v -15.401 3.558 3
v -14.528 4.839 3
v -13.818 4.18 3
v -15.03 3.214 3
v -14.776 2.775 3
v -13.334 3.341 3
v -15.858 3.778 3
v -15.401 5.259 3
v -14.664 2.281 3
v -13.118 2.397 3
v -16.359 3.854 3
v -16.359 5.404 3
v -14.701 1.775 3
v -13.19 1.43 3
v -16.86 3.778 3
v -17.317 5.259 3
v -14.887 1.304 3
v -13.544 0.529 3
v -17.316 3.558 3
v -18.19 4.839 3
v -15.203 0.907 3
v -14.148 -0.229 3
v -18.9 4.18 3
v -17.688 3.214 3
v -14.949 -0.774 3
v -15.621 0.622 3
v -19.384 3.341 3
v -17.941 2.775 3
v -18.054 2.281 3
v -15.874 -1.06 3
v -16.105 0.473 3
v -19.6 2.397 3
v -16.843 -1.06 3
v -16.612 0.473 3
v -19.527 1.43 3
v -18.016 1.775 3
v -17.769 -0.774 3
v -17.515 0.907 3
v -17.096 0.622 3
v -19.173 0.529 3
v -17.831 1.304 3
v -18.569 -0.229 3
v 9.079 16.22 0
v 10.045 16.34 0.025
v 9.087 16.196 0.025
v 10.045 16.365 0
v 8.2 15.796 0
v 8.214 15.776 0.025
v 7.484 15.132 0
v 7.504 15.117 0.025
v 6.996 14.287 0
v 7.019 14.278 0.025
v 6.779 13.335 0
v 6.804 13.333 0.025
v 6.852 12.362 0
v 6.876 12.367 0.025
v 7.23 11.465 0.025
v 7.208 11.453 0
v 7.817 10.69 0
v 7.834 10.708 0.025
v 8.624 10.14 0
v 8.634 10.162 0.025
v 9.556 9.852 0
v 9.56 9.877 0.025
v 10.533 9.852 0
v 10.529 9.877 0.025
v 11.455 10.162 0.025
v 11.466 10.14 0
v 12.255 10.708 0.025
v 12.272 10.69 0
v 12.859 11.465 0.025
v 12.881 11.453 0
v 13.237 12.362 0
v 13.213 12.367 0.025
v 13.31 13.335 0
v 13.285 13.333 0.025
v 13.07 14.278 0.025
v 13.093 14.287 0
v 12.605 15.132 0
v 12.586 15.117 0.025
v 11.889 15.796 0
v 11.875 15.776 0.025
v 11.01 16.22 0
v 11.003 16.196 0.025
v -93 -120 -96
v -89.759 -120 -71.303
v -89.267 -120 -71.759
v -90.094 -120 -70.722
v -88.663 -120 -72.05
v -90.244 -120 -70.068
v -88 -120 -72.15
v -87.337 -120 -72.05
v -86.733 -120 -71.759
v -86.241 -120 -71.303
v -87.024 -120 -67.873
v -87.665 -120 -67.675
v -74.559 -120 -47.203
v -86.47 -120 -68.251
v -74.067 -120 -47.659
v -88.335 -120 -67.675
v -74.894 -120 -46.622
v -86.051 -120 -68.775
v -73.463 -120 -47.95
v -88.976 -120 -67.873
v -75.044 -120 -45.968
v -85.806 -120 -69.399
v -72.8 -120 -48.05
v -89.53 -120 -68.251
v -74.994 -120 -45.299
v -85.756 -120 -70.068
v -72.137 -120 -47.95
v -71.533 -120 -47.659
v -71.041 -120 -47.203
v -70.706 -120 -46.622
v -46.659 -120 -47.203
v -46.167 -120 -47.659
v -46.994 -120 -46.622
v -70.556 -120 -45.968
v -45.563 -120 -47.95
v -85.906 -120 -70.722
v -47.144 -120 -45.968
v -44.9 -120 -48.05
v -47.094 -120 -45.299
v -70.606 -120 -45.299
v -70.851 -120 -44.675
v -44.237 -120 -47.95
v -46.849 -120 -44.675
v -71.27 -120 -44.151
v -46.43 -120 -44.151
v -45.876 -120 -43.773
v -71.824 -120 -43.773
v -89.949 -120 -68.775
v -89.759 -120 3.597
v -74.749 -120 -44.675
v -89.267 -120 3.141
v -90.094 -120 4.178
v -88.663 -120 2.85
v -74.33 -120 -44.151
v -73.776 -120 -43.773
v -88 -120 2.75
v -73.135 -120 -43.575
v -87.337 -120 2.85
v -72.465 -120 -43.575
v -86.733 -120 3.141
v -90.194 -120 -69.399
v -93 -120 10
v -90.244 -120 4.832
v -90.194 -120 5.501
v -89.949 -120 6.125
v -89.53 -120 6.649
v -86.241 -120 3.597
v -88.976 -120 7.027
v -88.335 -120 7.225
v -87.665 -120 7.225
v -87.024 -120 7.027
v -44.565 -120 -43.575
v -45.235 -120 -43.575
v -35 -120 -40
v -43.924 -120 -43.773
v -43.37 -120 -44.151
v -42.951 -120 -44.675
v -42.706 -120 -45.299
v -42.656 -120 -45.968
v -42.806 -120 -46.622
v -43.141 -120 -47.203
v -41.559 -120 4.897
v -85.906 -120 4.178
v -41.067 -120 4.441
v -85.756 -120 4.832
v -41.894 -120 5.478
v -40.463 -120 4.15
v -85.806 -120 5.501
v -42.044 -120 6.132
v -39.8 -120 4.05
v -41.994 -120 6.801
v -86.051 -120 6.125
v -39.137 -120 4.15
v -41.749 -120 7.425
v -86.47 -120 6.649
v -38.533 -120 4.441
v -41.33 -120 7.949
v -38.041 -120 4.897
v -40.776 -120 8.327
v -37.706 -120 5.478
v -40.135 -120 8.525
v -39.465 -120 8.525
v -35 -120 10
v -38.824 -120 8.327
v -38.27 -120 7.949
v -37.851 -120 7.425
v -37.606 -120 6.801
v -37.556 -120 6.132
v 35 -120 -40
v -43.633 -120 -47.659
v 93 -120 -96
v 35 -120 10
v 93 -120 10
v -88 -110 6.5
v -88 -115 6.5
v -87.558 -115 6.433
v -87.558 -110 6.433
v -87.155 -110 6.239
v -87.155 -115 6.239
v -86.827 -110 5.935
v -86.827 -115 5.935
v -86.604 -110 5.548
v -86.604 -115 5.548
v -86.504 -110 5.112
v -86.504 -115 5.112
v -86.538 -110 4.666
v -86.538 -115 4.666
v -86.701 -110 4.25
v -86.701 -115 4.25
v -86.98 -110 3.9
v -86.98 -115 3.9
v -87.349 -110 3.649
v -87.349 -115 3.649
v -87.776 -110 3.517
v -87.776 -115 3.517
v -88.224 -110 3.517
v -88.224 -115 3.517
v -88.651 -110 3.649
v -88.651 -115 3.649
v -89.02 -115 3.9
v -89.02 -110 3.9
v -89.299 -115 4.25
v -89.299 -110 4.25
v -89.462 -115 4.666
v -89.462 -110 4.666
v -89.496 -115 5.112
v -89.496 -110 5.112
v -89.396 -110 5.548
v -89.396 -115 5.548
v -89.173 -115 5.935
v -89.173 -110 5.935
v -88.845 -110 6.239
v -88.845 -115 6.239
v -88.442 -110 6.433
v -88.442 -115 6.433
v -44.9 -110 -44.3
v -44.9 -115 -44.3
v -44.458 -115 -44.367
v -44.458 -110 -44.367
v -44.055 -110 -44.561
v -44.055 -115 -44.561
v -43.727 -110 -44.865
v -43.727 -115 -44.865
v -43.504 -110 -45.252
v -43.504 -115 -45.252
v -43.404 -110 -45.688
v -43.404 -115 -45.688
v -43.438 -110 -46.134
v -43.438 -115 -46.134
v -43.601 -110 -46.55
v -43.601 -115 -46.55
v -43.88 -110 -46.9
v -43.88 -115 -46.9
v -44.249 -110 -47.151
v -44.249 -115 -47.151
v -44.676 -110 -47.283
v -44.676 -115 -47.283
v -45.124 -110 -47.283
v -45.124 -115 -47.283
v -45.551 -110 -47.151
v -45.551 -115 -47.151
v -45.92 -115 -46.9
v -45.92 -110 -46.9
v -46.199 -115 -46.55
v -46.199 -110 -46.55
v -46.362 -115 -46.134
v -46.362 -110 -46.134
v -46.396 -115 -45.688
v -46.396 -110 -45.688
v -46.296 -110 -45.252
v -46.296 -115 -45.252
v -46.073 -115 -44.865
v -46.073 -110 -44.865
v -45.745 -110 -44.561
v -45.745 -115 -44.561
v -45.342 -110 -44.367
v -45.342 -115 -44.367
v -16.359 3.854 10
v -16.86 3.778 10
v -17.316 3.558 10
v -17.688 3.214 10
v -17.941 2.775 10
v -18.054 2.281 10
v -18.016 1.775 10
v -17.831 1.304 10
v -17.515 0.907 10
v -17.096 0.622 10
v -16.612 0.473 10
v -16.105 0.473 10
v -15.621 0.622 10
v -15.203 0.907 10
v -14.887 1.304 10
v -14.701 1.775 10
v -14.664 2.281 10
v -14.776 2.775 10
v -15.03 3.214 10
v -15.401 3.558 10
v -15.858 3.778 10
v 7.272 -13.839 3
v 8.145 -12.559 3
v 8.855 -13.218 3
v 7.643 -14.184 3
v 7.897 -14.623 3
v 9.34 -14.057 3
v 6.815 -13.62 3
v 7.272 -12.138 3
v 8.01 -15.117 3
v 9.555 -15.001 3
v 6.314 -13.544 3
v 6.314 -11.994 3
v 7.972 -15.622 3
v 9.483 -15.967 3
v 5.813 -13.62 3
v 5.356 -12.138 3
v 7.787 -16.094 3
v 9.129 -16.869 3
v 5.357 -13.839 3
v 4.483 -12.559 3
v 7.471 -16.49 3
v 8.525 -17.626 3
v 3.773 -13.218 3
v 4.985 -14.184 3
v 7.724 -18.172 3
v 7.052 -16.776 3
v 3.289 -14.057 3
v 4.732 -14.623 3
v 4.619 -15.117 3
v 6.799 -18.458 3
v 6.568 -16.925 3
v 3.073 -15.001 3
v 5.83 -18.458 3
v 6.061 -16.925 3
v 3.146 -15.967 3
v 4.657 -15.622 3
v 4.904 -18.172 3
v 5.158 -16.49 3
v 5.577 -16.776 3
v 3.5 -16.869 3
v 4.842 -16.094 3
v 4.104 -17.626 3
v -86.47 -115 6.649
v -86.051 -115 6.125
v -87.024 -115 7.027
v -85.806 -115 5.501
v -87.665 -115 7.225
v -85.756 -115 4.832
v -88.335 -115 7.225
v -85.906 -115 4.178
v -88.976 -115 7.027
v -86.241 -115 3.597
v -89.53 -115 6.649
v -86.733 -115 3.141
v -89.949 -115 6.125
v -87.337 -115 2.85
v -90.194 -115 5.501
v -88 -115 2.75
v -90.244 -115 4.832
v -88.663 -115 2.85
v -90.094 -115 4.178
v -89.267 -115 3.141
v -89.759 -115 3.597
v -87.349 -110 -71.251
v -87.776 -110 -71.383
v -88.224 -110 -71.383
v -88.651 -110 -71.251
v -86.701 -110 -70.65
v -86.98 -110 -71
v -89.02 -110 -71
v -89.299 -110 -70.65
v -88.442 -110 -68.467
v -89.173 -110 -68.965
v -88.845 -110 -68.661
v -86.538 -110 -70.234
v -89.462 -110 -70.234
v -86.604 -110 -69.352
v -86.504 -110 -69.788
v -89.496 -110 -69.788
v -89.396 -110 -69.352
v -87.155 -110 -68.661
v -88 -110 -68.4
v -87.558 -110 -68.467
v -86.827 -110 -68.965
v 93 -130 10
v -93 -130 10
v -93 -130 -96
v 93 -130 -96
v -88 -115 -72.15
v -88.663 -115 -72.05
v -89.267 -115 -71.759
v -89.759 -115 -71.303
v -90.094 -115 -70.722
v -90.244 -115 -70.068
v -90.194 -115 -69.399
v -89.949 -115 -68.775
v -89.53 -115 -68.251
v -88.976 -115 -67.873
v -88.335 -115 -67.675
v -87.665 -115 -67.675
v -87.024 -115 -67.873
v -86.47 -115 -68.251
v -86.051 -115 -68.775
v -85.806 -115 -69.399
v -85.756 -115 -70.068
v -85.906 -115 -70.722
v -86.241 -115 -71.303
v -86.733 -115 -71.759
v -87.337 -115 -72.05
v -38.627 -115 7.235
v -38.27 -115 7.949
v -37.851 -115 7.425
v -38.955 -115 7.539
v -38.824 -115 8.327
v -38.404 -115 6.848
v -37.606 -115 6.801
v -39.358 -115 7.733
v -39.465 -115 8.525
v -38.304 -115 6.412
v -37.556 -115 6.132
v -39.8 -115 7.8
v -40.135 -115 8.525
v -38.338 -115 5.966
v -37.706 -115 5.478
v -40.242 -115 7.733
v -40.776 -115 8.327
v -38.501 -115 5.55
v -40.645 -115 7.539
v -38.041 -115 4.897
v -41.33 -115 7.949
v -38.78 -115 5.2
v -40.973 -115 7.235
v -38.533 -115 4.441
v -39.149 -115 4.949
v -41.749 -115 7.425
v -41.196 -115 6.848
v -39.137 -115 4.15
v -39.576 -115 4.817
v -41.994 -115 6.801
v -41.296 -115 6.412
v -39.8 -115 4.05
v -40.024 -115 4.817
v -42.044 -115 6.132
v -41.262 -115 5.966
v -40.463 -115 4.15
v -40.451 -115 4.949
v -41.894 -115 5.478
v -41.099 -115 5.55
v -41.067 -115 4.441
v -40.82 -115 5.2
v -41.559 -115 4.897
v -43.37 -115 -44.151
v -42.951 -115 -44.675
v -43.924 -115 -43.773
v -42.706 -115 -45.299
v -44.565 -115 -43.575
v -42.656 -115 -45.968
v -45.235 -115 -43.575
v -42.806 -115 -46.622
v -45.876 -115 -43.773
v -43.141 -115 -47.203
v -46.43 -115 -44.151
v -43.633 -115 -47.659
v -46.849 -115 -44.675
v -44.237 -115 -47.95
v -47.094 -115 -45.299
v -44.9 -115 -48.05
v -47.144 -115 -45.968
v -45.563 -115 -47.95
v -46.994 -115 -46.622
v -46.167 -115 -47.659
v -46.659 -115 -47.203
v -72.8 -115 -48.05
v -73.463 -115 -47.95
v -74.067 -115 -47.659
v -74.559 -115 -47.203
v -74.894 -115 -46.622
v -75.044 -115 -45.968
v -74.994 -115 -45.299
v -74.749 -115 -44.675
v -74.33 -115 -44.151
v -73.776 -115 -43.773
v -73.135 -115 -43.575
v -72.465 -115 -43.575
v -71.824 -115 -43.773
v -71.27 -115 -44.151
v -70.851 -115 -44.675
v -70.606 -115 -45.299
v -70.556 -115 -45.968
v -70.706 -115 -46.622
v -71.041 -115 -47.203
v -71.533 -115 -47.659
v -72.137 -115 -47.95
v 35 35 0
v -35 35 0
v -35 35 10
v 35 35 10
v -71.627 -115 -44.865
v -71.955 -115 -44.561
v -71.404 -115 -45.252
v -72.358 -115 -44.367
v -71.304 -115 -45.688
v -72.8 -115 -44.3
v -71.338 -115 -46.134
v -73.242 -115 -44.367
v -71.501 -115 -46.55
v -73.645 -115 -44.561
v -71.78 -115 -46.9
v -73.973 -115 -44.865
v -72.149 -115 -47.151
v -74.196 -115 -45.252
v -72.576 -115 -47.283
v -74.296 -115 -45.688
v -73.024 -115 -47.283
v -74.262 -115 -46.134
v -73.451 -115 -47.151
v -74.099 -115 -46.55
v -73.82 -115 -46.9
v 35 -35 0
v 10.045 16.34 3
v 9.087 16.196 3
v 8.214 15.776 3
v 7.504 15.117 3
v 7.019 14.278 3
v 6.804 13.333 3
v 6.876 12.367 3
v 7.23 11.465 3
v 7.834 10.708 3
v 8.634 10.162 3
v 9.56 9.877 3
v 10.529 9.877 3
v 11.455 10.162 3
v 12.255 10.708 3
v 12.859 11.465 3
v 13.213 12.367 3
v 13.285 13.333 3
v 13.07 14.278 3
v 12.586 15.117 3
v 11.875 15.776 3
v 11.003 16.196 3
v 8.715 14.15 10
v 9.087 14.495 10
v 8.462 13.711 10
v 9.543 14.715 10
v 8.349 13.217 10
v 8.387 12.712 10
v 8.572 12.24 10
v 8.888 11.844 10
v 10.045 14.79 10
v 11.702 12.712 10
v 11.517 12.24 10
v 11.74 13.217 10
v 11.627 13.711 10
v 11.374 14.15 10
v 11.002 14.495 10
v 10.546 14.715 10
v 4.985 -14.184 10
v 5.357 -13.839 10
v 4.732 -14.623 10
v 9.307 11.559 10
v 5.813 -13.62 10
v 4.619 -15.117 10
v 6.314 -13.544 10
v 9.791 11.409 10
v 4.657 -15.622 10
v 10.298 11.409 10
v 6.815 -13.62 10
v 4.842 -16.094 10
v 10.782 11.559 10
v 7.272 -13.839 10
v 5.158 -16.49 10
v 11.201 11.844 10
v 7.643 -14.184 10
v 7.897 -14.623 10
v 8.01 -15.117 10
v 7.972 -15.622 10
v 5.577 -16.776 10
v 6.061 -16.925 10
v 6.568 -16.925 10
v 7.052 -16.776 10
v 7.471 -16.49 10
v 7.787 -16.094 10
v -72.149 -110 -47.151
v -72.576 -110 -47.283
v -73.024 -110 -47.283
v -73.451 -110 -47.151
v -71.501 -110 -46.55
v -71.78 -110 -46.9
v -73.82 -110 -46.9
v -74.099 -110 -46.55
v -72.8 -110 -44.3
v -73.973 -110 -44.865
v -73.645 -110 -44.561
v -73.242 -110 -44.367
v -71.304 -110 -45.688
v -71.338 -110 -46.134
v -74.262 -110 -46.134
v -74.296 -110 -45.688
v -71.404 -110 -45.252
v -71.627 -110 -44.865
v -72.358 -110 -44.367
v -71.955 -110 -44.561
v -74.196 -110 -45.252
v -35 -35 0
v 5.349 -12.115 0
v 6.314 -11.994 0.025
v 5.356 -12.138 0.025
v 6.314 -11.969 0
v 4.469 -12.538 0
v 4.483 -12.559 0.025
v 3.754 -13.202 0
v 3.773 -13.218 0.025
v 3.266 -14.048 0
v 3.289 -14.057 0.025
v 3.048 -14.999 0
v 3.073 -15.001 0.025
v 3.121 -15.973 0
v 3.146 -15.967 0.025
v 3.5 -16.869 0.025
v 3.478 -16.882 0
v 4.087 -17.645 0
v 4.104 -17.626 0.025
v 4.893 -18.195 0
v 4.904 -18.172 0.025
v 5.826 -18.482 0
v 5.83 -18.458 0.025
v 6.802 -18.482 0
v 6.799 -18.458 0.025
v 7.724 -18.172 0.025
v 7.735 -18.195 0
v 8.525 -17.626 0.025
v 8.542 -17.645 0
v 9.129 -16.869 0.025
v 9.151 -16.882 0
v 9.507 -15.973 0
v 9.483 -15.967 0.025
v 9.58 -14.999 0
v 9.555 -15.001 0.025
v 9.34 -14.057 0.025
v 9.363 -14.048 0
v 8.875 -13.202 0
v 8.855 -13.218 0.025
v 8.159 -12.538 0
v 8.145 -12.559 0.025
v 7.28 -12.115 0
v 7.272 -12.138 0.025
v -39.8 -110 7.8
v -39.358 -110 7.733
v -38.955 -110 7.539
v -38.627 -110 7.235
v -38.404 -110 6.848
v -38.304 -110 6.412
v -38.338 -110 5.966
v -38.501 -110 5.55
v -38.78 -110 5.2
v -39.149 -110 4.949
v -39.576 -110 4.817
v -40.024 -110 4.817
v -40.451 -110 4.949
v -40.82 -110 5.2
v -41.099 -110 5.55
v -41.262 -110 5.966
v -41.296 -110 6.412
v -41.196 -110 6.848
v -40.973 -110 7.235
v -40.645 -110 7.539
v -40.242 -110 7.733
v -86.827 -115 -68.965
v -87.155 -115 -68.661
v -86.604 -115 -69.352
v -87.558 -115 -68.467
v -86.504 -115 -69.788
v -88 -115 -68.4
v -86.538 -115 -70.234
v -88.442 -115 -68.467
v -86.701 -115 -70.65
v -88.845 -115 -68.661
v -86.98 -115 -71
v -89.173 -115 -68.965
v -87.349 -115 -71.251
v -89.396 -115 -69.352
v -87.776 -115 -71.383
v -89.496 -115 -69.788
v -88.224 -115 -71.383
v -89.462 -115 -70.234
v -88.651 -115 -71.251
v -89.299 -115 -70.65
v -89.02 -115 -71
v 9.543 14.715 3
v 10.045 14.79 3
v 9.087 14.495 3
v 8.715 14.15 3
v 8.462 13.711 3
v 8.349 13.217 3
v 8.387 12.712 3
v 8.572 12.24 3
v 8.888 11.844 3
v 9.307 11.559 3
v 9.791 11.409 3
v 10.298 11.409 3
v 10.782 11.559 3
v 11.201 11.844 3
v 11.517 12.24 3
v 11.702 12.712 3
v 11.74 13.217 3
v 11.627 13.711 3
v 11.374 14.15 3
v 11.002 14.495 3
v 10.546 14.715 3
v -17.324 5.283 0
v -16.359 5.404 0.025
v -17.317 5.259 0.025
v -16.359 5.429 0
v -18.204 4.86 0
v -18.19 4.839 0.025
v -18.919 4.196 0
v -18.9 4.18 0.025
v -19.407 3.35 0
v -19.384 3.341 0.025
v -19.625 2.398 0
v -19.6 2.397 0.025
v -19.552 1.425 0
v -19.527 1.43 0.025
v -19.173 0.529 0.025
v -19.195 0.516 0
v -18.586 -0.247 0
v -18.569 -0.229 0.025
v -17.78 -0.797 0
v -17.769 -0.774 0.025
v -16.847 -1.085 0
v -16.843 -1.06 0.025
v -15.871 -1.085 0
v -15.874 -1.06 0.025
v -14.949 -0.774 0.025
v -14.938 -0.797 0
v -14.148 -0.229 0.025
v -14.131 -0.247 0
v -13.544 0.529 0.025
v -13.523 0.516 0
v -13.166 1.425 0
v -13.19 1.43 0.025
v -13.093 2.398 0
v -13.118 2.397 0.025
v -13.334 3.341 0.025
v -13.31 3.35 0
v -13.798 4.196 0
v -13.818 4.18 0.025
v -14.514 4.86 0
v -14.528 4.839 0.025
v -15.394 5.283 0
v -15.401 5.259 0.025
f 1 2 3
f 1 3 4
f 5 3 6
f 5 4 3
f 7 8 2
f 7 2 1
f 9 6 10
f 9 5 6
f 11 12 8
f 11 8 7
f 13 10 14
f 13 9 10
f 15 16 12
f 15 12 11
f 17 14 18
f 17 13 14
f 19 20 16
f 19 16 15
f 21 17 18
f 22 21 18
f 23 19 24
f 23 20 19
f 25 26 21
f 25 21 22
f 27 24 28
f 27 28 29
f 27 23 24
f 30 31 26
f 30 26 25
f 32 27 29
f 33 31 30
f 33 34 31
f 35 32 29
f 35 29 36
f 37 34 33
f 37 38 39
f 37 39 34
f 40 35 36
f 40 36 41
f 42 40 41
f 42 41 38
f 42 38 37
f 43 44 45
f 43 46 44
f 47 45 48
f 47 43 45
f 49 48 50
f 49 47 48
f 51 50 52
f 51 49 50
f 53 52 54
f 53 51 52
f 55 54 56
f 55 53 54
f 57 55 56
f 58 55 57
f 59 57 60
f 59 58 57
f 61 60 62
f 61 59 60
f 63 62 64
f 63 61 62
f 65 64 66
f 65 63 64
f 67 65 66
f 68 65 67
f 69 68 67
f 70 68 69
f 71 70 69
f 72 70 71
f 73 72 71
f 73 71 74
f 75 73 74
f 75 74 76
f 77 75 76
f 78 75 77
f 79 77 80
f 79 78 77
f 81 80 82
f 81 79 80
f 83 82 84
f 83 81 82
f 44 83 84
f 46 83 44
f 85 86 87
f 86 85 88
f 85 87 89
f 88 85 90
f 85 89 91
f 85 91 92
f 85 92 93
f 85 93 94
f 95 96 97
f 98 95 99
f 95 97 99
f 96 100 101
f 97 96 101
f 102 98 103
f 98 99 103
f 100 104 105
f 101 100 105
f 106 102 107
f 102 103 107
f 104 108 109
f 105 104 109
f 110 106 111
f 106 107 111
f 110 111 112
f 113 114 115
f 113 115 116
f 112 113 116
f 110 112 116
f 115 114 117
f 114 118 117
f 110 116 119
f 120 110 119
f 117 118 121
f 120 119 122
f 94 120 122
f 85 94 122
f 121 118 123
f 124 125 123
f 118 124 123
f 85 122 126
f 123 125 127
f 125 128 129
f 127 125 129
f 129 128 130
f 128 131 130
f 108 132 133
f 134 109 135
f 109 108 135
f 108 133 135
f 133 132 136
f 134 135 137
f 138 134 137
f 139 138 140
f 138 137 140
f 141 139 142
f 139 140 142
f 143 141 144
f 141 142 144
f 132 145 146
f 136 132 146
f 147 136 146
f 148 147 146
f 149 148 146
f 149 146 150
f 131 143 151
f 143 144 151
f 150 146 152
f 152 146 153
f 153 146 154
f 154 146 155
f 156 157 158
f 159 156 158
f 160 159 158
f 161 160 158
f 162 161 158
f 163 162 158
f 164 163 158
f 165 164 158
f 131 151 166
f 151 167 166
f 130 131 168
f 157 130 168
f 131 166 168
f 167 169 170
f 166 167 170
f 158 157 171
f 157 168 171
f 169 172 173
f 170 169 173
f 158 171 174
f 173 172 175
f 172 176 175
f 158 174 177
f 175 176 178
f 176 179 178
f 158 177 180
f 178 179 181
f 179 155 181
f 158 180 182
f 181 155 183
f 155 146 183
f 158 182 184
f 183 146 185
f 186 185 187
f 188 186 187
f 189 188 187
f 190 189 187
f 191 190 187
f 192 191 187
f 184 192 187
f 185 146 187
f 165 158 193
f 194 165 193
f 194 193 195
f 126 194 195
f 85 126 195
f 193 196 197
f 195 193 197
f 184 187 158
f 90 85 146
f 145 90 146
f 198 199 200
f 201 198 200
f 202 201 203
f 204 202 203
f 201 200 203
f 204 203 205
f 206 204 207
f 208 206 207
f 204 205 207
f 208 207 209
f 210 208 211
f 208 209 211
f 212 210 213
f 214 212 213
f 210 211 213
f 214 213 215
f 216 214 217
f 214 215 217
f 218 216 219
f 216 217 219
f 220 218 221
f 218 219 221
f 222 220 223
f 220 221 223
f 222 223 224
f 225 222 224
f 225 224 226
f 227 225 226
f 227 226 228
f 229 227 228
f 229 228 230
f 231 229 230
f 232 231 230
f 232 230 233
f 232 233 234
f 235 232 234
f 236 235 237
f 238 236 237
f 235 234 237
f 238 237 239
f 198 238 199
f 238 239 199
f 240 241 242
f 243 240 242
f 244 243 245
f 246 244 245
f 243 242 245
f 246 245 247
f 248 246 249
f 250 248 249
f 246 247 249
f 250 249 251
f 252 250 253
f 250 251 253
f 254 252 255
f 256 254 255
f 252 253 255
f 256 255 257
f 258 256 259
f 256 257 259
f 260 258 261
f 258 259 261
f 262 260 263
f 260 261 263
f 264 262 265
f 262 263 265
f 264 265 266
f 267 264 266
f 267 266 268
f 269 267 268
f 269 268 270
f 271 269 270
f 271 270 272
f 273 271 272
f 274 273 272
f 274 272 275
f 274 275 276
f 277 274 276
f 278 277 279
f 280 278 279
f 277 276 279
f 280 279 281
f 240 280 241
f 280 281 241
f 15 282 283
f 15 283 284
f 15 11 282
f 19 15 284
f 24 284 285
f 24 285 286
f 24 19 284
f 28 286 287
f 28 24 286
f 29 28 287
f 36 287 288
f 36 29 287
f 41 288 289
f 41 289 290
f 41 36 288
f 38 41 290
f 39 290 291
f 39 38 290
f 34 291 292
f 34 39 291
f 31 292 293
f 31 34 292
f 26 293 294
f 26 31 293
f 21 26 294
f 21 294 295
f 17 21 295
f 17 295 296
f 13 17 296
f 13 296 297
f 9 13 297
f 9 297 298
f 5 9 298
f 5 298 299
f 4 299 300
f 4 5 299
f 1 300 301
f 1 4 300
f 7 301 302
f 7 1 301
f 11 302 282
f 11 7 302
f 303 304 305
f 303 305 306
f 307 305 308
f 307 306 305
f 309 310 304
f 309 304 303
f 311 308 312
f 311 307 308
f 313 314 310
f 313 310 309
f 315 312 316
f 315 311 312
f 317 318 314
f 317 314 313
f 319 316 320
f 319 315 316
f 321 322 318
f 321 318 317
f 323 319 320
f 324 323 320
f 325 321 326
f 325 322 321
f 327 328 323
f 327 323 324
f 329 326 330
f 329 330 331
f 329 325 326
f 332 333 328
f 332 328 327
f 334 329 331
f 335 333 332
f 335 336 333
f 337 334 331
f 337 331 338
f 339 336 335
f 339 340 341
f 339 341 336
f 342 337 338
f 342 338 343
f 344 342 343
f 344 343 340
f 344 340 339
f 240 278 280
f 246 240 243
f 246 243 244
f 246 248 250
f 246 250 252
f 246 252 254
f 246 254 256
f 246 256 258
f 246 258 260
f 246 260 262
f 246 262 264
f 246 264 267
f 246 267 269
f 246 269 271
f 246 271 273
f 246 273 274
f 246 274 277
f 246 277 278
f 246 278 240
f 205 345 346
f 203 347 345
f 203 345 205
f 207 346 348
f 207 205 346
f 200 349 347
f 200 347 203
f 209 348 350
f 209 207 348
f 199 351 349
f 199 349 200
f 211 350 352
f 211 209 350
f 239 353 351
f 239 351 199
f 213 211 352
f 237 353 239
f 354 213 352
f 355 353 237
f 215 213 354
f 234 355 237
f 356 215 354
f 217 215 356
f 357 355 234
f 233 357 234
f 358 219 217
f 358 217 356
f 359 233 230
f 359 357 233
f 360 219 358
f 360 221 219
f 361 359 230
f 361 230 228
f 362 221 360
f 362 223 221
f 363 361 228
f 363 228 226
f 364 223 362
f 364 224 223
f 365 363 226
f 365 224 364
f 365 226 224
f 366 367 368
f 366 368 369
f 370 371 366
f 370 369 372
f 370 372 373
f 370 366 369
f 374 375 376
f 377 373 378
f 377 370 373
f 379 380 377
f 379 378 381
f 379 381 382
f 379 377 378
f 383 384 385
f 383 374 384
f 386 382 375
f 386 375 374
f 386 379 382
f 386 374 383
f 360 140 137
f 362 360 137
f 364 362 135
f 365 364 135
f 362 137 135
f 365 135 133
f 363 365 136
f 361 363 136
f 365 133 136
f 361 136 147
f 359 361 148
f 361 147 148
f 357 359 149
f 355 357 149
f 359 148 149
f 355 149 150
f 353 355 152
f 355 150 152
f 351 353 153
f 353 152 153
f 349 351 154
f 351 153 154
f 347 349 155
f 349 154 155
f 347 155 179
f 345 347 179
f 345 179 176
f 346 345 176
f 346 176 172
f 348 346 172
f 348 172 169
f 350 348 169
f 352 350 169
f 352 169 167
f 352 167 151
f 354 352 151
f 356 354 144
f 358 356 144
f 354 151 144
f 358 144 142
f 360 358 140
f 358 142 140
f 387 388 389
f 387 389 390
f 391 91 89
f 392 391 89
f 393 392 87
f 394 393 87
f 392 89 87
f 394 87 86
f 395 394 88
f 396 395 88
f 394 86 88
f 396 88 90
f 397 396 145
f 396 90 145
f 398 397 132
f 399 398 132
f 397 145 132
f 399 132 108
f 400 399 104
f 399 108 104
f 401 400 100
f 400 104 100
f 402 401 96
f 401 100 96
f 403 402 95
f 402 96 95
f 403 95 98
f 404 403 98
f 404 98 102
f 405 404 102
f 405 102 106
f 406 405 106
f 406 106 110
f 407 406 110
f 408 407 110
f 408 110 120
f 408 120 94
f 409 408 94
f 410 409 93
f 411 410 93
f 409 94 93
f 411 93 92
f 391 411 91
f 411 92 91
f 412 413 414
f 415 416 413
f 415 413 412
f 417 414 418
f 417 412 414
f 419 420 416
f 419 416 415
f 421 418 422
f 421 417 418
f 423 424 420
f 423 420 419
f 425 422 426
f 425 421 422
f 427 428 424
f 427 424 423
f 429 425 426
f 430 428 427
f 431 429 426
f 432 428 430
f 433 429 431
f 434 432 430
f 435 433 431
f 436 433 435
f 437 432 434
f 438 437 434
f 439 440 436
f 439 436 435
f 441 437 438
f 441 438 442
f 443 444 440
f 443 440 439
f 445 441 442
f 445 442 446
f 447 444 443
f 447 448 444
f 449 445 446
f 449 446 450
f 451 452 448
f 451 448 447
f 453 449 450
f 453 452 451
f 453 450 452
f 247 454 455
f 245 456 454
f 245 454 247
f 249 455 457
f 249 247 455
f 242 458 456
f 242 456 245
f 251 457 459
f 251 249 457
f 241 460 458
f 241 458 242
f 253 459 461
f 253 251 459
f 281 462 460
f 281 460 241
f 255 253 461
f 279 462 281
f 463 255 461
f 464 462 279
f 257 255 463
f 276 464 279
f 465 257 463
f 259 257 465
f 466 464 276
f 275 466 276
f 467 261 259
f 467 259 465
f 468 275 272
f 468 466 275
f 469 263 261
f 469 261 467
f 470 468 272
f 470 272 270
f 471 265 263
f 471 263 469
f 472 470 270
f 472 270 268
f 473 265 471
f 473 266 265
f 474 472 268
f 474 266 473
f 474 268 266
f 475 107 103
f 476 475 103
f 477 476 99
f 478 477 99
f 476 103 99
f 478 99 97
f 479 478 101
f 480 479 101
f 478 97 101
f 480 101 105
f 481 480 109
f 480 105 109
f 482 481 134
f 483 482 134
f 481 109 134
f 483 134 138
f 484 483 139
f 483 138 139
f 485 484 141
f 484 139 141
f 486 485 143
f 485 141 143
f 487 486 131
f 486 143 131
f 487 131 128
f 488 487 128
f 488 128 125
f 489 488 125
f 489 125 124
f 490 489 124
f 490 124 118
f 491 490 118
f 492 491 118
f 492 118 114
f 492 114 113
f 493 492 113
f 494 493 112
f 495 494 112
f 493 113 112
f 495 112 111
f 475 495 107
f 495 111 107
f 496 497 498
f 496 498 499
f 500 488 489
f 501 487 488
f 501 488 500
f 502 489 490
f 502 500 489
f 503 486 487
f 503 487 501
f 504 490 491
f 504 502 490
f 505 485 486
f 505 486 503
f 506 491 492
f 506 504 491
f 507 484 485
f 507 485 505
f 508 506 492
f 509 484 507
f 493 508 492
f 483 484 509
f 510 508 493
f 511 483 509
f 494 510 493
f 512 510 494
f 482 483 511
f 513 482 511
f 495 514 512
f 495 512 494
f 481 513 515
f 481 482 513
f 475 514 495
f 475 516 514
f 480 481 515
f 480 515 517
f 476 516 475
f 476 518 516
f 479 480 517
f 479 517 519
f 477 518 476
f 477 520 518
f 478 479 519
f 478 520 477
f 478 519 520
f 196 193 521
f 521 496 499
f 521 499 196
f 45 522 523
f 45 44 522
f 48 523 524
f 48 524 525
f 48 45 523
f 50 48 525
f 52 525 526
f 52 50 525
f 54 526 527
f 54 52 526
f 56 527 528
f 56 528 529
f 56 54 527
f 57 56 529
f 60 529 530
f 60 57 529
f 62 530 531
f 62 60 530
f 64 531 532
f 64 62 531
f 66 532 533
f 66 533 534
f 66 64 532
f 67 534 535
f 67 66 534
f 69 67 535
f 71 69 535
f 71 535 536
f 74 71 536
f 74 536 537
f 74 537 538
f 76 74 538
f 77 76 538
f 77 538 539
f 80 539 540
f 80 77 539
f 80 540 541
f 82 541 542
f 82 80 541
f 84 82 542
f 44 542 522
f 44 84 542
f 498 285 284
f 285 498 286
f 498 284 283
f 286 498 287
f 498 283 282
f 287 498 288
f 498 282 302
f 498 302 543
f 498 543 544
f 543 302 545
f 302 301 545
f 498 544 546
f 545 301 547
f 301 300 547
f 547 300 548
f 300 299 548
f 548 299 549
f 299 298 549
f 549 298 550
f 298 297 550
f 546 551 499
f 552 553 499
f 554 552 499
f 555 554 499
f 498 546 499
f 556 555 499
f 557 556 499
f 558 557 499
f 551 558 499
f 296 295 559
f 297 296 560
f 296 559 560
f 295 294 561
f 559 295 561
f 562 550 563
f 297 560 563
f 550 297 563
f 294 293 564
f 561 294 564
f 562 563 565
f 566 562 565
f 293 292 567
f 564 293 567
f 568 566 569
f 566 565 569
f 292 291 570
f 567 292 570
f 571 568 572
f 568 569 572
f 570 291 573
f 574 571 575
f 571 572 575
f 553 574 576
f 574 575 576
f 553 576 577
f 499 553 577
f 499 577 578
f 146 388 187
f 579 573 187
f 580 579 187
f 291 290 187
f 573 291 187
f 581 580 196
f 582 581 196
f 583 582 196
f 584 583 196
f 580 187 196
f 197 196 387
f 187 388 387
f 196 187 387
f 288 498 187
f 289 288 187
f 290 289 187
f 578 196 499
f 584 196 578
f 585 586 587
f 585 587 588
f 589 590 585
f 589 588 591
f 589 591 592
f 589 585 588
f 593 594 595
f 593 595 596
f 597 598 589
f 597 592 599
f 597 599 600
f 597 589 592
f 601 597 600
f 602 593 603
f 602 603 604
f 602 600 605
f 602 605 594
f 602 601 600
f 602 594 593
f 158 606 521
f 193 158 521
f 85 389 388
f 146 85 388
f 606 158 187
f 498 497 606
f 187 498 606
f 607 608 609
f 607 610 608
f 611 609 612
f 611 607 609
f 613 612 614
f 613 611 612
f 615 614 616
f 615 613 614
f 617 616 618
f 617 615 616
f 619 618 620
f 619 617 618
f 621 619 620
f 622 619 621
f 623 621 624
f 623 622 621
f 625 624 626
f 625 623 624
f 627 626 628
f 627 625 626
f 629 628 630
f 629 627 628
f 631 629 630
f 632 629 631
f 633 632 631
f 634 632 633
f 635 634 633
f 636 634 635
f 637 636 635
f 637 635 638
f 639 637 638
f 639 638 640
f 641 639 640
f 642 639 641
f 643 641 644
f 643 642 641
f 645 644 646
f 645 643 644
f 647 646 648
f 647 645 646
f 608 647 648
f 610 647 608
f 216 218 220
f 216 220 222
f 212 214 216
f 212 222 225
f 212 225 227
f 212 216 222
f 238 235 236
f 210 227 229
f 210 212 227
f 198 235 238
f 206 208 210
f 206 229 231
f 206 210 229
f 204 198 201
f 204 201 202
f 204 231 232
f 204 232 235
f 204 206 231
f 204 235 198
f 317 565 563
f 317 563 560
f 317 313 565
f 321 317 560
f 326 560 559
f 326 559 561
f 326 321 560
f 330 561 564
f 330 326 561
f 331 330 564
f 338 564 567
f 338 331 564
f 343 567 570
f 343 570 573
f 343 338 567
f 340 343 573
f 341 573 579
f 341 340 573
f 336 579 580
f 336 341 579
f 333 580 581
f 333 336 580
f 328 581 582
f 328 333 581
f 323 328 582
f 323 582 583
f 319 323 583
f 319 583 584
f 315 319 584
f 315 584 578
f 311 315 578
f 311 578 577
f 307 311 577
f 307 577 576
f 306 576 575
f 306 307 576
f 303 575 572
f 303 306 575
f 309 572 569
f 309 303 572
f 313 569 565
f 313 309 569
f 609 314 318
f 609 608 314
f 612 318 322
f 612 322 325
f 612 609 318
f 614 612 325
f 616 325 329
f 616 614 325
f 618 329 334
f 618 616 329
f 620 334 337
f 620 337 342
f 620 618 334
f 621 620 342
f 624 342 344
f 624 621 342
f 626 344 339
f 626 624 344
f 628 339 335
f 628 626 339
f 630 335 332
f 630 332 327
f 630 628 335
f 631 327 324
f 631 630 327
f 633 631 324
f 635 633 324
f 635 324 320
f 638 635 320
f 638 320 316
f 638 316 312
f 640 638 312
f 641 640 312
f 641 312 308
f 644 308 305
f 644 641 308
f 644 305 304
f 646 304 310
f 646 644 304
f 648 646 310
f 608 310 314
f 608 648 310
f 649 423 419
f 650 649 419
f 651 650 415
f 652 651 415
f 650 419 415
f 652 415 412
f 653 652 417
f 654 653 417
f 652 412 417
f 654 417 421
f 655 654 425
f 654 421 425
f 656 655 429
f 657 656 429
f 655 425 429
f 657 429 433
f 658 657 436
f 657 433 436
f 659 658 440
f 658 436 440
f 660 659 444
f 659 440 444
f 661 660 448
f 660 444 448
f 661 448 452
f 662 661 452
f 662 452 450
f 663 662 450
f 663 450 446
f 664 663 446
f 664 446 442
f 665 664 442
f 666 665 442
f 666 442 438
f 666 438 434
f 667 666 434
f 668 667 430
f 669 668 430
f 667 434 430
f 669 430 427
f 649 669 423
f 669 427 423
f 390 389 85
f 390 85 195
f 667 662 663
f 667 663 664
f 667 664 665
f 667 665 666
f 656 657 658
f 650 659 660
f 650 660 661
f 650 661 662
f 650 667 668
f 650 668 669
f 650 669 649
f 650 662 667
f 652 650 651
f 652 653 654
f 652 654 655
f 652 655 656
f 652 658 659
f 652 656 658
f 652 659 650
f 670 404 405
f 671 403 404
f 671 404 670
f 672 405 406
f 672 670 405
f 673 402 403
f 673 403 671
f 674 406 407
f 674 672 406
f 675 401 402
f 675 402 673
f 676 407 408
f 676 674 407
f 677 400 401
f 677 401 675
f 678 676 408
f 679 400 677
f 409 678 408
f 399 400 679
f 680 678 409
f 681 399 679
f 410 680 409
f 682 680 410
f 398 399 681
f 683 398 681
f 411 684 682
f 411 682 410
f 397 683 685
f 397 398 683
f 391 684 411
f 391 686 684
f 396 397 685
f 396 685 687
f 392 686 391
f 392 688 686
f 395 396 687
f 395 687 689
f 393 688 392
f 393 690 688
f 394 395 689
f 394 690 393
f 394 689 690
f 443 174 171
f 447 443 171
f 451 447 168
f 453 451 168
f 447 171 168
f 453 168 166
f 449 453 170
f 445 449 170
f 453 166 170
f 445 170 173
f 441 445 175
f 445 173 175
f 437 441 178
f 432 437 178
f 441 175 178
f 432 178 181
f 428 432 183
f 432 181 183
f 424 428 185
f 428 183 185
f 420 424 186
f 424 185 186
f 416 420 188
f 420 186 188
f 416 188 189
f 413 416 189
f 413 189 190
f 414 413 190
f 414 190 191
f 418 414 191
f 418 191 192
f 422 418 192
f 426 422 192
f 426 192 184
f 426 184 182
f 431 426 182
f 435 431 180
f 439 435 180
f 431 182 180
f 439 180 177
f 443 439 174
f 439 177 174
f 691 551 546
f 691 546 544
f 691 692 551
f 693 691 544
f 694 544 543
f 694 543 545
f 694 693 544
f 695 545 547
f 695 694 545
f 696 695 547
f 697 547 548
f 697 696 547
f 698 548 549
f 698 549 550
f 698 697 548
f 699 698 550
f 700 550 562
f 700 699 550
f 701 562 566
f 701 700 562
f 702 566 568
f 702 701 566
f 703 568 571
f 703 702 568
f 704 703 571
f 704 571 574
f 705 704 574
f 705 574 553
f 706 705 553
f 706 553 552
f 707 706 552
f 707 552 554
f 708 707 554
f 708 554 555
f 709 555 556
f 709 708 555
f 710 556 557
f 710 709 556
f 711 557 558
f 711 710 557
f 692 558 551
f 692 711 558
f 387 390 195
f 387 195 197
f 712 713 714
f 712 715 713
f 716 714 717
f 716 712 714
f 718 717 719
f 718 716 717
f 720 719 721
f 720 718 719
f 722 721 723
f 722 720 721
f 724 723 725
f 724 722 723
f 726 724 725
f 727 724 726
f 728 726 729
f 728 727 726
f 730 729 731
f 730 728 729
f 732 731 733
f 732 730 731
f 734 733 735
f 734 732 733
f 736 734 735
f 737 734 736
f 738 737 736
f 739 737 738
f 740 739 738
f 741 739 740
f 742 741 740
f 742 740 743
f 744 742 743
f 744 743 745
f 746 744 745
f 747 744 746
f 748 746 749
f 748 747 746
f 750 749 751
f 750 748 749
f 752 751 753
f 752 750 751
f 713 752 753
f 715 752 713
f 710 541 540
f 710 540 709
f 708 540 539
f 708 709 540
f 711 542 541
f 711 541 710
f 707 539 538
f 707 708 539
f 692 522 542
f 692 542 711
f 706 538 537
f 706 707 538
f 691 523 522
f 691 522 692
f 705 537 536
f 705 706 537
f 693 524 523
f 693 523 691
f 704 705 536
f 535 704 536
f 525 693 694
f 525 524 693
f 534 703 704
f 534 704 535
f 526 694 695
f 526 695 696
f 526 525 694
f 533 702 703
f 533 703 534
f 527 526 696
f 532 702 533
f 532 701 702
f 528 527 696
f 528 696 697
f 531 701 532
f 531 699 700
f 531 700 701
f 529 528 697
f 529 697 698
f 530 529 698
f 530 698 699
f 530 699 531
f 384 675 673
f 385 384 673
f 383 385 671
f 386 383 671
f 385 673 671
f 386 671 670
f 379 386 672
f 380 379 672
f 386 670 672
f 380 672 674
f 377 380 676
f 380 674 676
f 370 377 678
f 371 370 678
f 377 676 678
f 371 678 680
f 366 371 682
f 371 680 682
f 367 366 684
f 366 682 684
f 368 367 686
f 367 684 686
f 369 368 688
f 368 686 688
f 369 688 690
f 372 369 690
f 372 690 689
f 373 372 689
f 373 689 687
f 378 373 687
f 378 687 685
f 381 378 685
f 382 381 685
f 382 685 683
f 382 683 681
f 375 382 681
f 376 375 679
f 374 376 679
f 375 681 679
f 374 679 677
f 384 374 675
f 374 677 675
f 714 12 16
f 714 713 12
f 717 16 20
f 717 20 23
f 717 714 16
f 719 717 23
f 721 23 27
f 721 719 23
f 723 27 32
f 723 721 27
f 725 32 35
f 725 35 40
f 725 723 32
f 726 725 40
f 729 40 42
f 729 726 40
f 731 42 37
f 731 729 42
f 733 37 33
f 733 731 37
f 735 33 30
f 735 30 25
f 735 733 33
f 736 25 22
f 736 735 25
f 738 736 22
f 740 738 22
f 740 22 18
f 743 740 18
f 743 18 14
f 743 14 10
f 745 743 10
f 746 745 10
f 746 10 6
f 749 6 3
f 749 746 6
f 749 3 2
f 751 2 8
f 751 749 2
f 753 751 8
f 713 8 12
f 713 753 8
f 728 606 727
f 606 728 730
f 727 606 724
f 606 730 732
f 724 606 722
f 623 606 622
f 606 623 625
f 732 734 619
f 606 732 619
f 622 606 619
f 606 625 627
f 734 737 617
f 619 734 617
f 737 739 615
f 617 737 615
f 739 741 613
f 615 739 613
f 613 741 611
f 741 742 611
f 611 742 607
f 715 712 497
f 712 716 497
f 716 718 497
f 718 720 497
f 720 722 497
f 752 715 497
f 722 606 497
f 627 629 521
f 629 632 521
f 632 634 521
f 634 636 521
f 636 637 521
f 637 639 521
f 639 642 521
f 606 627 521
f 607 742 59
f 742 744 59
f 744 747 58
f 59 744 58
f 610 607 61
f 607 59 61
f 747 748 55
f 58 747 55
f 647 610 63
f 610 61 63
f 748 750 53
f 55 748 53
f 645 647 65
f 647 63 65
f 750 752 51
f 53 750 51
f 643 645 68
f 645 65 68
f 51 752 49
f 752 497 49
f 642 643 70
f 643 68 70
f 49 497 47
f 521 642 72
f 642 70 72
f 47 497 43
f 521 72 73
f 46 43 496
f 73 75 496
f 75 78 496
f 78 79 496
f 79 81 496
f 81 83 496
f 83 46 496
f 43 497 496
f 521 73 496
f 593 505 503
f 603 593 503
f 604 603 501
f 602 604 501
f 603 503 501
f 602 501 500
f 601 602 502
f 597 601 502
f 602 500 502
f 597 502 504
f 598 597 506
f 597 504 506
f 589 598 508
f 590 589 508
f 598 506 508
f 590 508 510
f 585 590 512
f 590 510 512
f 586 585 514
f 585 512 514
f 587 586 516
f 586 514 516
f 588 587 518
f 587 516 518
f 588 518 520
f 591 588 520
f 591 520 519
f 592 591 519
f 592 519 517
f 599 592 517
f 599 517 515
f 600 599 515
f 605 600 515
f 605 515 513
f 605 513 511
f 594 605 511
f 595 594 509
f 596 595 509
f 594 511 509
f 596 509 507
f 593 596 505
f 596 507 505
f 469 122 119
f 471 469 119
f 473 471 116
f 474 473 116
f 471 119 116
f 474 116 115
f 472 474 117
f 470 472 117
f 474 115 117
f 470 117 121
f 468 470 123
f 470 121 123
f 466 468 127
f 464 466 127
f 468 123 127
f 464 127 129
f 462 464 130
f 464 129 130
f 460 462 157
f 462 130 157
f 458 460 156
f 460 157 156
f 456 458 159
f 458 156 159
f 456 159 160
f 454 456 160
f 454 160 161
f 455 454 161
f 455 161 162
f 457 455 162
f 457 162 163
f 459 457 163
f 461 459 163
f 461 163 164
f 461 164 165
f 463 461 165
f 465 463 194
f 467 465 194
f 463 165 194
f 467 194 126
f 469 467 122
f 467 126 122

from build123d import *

# Parameters (mm, degrees)
SKETCH1_W                     = 70
SKETCH1_H                     = 70
BOSS_EXTRUDE1_DEPTH           = 10
CBORE_FOR_M3_SHCS1_AT_2_COUNT = 2
CBORE_FOR_M3_SHCS1_AT_2_PITCH = 28.578838325
CBORE_FOR_M3_SHCS1_AT_3_COUNT = 2
CBORE_FOR_M3_SHCS1_AT_3_PITCH = 28.578838325
SKETCH14_W                    = 70
SKETCH14_H                    = 10
BOSS_EXTRUDE2_DEPTH           = 95
SKETCH13_W                    = 186
SKETCH13_H                    = 106
BOSS_EXTRUDE3_DEPTH           = 10
CHAMFER1_SIZE                 = 40
CHAMFER1_SIZE2                = 85
SKETCH18_R                    = 2.25
BOSS_EXTRUDE4_DEPTH           = 5
SKETCH19_R                    = 1.5
BOSS_EXTRUDE5_DEPTH           = 5


with BuildPart() as part:
    # Sketch1 → Boss-Extrude1 (new body)
    with BuildSketch(Plane.XY):
        Rectangle(SKETCH1_W, SKETCH1_H)
    extrude(amount=BOSS_EXTRUDE1_DEPTH)

    # Sketch4 → CBORE for M3 SHCS1 (revolve, cut)
    with BuildSketch(Plane(origin=(6.314276634, -15.244012286, 0), x_dir=(0, 1, 0), z_dir=(1, 0, 0))):
        Polygon((0, 0), (0, 10), (1.7, 10), (1.7, 3), (3.25, 3), (3.25, 0.025), (3.275, 0), align=None)
    cbore_for_m3_shcs1 = revolve(axis=Axis((6.314276634, -15.244012286, -6.35), (0, 0, 1)), mode=Mode.SUBTRACT)

    # CBORE for M3 SHCS1 at 2: CBORE for M3 SHCS1 ×2
    with Locations(*[Vector(0.13052619222005196, 0.9914448613738104, 0) * (i * CBORE_FOR_M3_SHCS1_AT_2_PITCH) for i in range(1, CBORE_FOR_M3_SHCS1_AT_2_COUNT)]):
        add(cbore_for_m3_shcs1, mode=Mode.SUBTRACT)

    # CBORE for M3 SHCS1 at 3: CBORE for M3 SHCS1 ×2
    with Locations(*[Vector(-0.7933533402912364, 0.608761429008719, 0) * (i * CBORE_FOR_M3_SHCS1_AT_3_PITCH) for i in range(1, CBORE_FOR_M3_SHCS1_AT_3_COUNT)]):
        add(cbore_for_m3_shcs1, mode=Mode.SUBTRACT)

    # Sketch14 → Boss-Extrude2 (add)
    with BuildSketch(Plane.XZ.offset(35)):
        with Locations((0, 5)):
            Rectangle(SKETCH14_W, SKETCH14_H)
    extrude(amount=BOSS_EXTRUDE2_DEPTH)

    # Sketch13 → Boss-Extrude3 (add)
    with BuildSketch(Plane.XZ.offset(130)):
        with Locations((0, -43)):
            Rectangle(SKETCH13_W, SKETCH13_H)
    extrude(amount=-BOSS_EXTRUDE3_DEPTH)

    # Chamfer1
    chamfer1_edges = [part.edges().sort_by_distance(p)[0] for p in [
        (0, -120, 0),
    ]]
    chamfer1_side = [part.faces().sort_by_distance(p)[0] for p in [
        (0, -120, -44.766933109),
    ]]
    chamfer(chamfer1_edges, length=CHAMFER1_SIZE, length2=CHAMFER1_SIZE2, reference=chamfer1_side[0])

    # Sketch18 → Boss-Extrude4 (add)
    with BuildSketch(Plane(origin=(0, -120, -115), x_dir=(1, 0, 0), z_dir=(0, 1, 0))):
        with Locations(Location((-88, -45.1, 0), (0, 0, 90))):
            Circle(SKETCH18_R)
        with Locations(Location((-44.9, -69.2, 0), (0, 0, 90))):
            Circle(SKETCH18_R)
        with Locations(Location((-72.8, -69.2, 0), (0, 0, 90))):
            Circle(SKETCH18_R)
        with Locations(Location((-88, -120, 0), (0, 0, 90))):
            Circle(SKETCH18_R)
        with Locations(Location((-39.8, -121.3, 0), (0, 0, 90))):
            Circle(SKETCH18_R)
    extrude(amount=BOSS_EXTRUDE4_DEPTH)

    # Sketch19 → Boss-Extrude5 (add)
    with BuildSketch(Plane(origin=(0, -115, 0), x_dir=(1, 0, 0), z_dir=(0, 1, 0))):
        with Locations(Location((-88, 69.9, 0), (0, 0, 270))):
            Circle(SKETCH19_R)
        with Locations(Location((-72.8, 45.8, 0), (0, 0, 270))):
            Circle(SKETCH19_R)
        with Locations(Location((-44.9, 45.8, 0), (0, 0, 270))):
            Circle(SKETCH19_R)
        with Locations(Location((-88, -5, 0), (0, 0, 270))):
            Circle(SKETCH19_R)
        with Locations(Location((-39.8, -6.3, 0), (0, 0, 270))):
            Circle(SKETCH19_R)
    extrude(amount=BOSS_EXTRUDE5_DEPTH)


solid = part.part
